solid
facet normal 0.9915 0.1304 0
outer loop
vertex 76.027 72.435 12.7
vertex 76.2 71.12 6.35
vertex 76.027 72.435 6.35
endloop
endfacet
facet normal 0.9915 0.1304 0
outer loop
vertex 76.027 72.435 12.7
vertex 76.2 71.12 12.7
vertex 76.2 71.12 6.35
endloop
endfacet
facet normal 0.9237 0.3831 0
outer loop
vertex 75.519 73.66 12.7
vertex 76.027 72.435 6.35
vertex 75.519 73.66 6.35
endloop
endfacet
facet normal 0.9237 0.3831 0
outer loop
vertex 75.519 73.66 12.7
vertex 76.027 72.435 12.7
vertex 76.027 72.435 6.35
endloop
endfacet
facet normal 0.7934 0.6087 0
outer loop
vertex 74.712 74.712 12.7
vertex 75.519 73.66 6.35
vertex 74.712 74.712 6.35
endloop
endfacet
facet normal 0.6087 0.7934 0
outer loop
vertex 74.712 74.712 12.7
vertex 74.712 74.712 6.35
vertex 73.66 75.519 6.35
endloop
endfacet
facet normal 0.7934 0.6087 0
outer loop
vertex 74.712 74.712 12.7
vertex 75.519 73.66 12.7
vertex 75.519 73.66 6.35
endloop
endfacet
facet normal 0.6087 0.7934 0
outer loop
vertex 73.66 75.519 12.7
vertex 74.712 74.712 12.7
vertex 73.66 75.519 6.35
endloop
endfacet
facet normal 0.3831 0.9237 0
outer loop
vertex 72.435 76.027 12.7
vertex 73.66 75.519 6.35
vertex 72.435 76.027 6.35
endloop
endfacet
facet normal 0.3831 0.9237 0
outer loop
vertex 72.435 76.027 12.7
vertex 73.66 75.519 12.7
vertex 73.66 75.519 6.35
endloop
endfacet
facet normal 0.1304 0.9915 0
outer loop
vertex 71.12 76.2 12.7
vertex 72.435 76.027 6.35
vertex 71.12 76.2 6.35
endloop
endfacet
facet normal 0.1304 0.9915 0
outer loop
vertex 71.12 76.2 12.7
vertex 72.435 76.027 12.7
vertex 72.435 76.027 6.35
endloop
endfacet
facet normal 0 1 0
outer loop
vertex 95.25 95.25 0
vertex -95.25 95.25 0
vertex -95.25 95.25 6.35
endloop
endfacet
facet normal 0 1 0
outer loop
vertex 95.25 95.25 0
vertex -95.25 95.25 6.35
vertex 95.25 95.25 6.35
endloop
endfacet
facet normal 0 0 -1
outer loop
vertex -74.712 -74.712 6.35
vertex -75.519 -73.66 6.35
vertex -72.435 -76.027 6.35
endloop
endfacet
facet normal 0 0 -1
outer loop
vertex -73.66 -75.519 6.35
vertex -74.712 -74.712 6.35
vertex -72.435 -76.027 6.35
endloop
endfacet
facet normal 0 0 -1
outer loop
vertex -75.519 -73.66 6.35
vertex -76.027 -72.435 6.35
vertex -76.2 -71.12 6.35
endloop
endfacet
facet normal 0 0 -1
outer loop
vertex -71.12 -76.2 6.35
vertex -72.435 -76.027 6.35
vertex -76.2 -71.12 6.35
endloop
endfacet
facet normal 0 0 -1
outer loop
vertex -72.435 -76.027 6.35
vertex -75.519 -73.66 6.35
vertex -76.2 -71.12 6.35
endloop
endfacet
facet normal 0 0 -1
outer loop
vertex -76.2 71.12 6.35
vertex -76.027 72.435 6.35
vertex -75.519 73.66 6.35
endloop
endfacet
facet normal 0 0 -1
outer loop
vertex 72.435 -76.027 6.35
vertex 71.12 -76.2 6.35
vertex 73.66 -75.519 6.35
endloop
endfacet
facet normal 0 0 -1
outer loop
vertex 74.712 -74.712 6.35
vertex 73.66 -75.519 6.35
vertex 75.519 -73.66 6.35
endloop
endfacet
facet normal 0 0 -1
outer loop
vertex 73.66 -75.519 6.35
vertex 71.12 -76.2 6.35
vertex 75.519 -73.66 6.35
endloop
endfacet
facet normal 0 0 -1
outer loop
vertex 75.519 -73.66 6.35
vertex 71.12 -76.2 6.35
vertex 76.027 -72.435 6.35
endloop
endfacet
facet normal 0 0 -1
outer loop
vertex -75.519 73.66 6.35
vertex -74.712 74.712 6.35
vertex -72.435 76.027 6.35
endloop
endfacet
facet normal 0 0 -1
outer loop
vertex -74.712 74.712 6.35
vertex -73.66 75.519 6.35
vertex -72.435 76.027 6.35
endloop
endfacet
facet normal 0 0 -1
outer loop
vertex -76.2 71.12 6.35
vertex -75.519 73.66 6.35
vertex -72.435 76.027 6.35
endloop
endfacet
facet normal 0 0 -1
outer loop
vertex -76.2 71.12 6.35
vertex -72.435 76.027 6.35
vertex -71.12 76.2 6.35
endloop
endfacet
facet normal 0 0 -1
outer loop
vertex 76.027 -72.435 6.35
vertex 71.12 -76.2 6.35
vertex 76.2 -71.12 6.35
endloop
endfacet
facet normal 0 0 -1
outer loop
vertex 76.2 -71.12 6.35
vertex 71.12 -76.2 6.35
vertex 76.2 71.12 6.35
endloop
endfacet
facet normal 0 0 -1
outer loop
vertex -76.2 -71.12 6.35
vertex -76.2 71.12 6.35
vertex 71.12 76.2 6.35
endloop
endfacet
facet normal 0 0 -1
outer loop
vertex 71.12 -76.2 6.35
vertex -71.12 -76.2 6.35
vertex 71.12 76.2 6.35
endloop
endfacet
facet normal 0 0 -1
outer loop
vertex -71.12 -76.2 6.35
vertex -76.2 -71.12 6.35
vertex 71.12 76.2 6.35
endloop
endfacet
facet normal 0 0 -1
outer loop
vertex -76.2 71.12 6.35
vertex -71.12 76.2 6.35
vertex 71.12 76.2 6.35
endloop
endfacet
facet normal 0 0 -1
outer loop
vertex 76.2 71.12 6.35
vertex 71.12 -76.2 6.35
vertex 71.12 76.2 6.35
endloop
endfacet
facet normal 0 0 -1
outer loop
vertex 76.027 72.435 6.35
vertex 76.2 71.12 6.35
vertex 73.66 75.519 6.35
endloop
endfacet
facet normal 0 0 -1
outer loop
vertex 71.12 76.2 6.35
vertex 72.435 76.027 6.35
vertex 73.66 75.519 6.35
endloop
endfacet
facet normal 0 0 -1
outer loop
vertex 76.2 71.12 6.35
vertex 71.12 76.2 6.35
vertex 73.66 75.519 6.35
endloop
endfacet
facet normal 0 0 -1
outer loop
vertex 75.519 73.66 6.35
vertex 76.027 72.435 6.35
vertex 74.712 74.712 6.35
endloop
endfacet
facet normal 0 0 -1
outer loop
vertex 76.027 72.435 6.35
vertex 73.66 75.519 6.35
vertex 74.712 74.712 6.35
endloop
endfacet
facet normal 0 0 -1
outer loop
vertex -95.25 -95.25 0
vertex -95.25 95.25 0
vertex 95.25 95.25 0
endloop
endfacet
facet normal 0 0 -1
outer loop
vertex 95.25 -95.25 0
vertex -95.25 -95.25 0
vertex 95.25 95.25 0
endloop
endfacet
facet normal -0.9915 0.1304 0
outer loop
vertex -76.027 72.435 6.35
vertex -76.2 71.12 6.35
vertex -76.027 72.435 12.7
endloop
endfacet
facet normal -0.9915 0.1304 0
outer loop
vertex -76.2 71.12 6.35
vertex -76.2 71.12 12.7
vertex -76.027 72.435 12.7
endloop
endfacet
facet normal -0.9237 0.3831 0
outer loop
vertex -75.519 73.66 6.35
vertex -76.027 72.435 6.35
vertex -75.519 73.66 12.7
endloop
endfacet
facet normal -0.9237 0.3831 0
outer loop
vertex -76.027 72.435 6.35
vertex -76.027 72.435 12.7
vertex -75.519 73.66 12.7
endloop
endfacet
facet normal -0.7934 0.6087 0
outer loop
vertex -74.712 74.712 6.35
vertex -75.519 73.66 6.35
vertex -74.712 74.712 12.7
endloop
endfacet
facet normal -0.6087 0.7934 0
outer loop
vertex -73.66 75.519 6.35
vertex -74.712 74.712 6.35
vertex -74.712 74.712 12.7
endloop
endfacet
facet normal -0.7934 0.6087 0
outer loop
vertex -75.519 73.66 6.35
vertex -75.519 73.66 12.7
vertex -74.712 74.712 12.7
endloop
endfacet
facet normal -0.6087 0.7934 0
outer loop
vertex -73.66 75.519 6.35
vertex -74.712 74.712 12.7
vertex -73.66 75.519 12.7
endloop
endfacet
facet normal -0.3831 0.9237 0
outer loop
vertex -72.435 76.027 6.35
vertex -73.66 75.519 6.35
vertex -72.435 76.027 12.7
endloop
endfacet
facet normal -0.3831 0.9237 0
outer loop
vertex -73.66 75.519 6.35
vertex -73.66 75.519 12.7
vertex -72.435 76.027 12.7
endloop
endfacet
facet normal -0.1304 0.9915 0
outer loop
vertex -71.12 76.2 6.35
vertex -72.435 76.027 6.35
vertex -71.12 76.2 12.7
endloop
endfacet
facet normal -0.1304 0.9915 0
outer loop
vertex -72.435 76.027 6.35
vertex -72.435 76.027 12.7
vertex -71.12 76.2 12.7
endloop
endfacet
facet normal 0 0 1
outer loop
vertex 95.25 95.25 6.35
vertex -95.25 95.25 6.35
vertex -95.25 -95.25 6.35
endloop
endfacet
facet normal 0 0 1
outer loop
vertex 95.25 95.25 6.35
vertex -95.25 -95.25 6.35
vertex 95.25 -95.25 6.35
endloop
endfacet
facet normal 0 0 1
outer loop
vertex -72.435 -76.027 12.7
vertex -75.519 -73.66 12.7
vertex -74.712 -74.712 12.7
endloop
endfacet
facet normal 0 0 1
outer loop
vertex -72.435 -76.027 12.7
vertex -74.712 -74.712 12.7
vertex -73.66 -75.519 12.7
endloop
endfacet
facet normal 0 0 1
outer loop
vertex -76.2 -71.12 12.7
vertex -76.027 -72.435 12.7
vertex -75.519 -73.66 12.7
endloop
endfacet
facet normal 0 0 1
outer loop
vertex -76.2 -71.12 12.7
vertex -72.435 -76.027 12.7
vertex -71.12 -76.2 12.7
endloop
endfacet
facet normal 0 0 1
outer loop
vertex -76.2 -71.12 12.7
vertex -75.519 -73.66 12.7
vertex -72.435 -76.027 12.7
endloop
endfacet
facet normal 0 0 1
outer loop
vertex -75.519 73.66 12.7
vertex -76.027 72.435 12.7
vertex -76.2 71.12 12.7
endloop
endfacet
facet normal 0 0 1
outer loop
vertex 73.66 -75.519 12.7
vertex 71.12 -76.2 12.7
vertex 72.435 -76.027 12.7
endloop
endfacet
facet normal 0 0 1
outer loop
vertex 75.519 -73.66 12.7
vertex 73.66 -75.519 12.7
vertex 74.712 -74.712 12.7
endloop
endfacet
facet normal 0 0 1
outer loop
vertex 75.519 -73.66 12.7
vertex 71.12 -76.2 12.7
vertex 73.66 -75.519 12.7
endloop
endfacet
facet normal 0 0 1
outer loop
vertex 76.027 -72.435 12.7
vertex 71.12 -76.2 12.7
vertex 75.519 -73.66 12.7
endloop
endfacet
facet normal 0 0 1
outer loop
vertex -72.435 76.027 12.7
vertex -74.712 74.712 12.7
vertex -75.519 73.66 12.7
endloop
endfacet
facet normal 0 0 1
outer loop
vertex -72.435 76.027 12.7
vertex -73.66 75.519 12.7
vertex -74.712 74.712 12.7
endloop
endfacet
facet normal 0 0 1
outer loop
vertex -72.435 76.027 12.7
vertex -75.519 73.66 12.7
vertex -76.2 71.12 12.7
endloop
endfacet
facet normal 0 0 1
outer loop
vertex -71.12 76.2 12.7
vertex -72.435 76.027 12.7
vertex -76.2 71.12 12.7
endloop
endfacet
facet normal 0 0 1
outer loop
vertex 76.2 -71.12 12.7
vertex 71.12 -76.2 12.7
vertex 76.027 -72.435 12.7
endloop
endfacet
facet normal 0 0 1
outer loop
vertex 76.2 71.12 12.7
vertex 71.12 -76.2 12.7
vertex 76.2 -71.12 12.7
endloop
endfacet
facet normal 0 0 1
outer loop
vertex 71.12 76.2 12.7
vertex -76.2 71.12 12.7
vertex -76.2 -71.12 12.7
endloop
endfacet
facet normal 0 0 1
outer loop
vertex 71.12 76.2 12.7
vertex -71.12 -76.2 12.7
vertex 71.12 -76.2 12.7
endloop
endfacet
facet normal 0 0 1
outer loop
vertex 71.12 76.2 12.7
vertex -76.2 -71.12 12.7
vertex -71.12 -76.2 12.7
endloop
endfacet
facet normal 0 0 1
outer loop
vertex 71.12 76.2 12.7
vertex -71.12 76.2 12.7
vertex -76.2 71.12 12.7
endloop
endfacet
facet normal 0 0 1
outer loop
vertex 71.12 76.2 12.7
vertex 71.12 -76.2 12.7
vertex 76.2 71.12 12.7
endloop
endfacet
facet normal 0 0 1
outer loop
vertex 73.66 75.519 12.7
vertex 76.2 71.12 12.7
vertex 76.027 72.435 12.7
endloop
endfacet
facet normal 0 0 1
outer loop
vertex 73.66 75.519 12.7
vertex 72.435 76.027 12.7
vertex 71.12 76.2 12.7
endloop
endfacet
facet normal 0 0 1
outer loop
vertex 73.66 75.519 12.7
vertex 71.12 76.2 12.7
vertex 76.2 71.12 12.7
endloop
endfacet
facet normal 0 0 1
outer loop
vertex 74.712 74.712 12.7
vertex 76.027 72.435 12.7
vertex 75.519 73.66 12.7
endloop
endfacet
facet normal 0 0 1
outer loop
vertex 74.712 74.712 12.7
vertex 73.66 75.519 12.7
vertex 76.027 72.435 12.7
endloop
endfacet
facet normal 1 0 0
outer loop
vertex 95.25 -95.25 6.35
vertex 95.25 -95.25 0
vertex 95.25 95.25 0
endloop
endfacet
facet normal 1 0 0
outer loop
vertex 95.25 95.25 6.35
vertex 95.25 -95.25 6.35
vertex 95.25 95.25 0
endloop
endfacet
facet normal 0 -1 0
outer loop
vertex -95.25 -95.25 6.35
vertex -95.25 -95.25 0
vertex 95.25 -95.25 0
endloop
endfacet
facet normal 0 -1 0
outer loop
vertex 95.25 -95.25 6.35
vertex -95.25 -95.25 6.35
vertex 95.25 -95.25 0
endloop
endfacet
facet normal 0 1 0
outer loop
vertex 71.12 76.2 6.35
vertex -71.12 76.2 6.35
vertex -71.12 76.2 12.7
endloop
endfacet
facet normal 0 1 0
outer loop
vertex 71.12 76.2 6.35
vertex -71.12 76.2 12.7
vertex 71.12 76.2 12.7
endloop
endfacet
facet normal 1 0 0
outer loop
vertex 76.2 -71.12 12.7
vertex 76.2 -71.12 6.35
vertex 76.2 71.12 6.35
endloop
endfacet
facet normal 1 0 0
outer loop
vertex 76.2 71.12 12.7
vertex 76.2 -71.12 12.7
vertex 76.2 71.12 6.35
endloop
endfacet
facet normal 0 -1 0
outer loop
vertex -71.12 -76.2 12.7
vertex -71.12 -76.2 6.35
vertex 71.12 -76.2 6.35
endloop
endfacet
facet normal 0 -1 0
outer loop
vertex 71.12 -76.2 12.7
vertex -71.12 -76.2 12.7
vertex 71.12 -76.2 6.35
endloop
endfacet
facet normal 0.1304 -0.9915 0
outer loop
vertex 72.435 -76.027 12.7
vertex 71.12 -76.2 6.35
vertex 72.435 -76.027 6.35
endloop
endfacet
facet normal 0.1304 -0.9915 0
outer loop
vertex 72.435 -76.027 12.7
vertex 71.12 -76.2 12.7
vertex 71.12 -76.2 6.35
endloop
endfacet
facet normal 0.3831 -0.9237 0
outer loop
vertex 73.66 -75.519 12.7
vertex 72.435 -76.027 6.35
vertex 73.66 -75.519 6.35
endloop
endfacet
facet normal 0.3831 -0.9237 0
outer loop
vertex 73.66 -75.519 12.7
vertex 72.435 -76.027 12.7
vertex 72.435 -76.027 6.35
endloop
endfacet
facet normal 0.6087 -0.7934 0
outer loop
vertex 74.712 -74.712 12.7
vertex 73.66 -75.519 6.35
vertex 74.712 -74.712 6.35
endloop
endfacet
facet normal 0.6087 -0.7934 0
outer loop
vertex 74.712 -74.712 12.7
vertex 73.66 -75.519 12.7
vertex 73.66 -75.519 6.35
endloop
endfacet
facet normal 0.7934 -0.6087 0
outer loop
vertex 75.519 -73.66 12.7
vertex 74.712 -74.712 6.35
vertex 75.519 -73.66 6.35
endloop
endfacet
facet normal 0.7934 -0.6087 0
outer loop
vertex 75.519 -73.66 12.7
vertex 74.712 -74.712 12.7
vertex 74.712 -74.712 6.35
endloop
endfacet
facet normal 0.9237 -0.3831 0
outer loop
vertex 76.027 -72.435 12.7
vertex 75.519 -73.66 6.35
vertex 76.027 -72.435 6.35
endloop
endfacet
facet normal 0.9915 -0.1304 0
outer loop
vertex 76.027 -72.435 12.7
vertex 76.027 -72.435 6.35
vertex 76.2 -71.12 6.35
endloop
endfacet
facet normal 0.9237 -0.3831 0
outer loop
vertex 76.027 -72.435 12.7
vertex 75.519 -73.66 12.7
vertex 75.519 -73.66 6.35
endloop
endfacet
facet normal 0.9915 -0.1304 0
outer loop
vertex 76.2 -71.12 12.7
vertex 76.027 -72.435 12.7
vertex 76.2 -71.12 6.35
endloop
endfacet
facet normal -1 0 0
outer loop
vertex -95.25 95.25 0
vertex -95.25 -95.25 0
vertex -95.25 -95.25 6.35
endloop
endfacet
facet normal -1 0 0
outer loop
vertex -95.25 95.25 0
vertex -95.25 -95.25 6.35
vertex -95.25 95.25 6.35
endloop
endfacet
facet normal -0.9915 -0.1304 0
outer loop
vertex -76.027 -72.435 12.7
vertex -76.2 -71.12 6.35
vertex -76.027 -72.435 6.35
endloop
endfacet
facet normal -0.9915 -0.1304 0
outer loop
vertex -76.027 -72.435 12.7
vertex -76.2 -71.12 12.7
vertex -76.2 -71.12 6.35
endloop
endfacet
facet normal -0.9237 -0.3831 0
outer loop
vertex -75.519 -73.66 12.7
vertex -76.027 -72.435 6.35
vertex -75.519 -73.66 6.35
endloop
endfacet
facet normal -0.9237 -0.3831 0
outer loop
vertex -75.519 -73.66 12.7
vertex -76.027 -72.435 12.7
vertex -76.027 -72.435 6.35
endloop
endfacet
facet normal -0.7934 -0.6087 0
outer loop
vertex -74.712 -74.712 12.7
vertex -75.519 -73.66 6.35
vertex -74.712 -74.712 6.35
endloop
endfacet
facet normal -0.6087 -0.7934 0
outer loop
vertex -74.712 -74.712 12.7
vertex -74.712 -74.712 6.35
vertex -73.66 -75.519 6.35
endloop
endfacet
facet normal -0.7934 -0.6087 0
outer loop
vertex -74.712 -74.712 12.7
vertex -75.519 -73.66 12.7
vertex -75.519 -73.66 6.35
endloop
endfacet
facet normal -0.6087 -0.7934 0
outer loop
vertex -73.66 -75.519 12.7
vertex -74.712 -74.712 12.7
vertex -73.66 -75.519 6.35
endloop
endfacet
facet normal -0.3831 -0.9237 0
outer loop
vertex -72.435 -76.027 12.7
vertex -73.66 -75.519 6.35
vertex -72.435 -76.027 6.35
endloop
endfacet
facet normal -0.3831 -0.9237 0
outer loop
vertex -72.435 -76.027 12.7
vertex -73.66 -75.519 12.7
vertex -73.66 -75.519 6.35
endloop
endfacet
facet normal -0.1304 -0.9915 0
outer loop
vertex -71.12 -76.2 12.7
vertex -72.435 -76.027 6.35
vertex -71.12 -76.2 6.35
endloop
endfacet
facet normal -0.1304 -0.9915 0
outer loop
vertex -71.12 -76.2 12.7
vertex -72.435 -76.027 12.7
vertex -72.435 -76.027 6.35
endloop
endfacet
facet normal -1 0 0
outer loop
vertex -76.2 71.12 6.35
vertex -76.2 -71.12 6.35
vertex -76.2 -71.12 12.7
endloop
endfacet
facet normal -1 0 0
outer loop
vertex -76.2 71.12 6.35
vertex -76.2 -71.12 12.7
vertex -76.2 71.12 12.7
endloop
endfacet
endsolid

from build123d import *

# Parameters (mm, degrees)
F0_W     = 190.5
F0_H     = 190.5
F1_DEPTH = 6.35
F2_W     = 152.4
F2_H     = 152.4
F3_DEPTH = 6.35
F4_R     = 5.08


with BuildPart() as f1:
    # F0 (on Top) → F1 (new body)
    with BuildSketch(Plane.XY):
        Rectangle(F0_W, F0_H)
    extrude(amount=F1_DEPTH)


with BuildPart() as f3:
    # F2 (on face) → F3 (new body)
    with BuildSketch(Plane.XY.offset(6.35)):
        Rectangle(F2_W, F2_H)
    extrude(amount=F3_DEPTH)

    # F4
    f4_edges = [f3.edges().sort_by_distance(p)[0] for p in [
        (76.2, -76.2, 9.525),
        (-76.2, -76.2, 9.525),
        (76.2, 76.2, 9.525),
        (-76.2, 76.2, 9.525),
    ]]
    fillet(f4_edges, radius=F4_R)


solid = Compound([f1.part, f3.part])
